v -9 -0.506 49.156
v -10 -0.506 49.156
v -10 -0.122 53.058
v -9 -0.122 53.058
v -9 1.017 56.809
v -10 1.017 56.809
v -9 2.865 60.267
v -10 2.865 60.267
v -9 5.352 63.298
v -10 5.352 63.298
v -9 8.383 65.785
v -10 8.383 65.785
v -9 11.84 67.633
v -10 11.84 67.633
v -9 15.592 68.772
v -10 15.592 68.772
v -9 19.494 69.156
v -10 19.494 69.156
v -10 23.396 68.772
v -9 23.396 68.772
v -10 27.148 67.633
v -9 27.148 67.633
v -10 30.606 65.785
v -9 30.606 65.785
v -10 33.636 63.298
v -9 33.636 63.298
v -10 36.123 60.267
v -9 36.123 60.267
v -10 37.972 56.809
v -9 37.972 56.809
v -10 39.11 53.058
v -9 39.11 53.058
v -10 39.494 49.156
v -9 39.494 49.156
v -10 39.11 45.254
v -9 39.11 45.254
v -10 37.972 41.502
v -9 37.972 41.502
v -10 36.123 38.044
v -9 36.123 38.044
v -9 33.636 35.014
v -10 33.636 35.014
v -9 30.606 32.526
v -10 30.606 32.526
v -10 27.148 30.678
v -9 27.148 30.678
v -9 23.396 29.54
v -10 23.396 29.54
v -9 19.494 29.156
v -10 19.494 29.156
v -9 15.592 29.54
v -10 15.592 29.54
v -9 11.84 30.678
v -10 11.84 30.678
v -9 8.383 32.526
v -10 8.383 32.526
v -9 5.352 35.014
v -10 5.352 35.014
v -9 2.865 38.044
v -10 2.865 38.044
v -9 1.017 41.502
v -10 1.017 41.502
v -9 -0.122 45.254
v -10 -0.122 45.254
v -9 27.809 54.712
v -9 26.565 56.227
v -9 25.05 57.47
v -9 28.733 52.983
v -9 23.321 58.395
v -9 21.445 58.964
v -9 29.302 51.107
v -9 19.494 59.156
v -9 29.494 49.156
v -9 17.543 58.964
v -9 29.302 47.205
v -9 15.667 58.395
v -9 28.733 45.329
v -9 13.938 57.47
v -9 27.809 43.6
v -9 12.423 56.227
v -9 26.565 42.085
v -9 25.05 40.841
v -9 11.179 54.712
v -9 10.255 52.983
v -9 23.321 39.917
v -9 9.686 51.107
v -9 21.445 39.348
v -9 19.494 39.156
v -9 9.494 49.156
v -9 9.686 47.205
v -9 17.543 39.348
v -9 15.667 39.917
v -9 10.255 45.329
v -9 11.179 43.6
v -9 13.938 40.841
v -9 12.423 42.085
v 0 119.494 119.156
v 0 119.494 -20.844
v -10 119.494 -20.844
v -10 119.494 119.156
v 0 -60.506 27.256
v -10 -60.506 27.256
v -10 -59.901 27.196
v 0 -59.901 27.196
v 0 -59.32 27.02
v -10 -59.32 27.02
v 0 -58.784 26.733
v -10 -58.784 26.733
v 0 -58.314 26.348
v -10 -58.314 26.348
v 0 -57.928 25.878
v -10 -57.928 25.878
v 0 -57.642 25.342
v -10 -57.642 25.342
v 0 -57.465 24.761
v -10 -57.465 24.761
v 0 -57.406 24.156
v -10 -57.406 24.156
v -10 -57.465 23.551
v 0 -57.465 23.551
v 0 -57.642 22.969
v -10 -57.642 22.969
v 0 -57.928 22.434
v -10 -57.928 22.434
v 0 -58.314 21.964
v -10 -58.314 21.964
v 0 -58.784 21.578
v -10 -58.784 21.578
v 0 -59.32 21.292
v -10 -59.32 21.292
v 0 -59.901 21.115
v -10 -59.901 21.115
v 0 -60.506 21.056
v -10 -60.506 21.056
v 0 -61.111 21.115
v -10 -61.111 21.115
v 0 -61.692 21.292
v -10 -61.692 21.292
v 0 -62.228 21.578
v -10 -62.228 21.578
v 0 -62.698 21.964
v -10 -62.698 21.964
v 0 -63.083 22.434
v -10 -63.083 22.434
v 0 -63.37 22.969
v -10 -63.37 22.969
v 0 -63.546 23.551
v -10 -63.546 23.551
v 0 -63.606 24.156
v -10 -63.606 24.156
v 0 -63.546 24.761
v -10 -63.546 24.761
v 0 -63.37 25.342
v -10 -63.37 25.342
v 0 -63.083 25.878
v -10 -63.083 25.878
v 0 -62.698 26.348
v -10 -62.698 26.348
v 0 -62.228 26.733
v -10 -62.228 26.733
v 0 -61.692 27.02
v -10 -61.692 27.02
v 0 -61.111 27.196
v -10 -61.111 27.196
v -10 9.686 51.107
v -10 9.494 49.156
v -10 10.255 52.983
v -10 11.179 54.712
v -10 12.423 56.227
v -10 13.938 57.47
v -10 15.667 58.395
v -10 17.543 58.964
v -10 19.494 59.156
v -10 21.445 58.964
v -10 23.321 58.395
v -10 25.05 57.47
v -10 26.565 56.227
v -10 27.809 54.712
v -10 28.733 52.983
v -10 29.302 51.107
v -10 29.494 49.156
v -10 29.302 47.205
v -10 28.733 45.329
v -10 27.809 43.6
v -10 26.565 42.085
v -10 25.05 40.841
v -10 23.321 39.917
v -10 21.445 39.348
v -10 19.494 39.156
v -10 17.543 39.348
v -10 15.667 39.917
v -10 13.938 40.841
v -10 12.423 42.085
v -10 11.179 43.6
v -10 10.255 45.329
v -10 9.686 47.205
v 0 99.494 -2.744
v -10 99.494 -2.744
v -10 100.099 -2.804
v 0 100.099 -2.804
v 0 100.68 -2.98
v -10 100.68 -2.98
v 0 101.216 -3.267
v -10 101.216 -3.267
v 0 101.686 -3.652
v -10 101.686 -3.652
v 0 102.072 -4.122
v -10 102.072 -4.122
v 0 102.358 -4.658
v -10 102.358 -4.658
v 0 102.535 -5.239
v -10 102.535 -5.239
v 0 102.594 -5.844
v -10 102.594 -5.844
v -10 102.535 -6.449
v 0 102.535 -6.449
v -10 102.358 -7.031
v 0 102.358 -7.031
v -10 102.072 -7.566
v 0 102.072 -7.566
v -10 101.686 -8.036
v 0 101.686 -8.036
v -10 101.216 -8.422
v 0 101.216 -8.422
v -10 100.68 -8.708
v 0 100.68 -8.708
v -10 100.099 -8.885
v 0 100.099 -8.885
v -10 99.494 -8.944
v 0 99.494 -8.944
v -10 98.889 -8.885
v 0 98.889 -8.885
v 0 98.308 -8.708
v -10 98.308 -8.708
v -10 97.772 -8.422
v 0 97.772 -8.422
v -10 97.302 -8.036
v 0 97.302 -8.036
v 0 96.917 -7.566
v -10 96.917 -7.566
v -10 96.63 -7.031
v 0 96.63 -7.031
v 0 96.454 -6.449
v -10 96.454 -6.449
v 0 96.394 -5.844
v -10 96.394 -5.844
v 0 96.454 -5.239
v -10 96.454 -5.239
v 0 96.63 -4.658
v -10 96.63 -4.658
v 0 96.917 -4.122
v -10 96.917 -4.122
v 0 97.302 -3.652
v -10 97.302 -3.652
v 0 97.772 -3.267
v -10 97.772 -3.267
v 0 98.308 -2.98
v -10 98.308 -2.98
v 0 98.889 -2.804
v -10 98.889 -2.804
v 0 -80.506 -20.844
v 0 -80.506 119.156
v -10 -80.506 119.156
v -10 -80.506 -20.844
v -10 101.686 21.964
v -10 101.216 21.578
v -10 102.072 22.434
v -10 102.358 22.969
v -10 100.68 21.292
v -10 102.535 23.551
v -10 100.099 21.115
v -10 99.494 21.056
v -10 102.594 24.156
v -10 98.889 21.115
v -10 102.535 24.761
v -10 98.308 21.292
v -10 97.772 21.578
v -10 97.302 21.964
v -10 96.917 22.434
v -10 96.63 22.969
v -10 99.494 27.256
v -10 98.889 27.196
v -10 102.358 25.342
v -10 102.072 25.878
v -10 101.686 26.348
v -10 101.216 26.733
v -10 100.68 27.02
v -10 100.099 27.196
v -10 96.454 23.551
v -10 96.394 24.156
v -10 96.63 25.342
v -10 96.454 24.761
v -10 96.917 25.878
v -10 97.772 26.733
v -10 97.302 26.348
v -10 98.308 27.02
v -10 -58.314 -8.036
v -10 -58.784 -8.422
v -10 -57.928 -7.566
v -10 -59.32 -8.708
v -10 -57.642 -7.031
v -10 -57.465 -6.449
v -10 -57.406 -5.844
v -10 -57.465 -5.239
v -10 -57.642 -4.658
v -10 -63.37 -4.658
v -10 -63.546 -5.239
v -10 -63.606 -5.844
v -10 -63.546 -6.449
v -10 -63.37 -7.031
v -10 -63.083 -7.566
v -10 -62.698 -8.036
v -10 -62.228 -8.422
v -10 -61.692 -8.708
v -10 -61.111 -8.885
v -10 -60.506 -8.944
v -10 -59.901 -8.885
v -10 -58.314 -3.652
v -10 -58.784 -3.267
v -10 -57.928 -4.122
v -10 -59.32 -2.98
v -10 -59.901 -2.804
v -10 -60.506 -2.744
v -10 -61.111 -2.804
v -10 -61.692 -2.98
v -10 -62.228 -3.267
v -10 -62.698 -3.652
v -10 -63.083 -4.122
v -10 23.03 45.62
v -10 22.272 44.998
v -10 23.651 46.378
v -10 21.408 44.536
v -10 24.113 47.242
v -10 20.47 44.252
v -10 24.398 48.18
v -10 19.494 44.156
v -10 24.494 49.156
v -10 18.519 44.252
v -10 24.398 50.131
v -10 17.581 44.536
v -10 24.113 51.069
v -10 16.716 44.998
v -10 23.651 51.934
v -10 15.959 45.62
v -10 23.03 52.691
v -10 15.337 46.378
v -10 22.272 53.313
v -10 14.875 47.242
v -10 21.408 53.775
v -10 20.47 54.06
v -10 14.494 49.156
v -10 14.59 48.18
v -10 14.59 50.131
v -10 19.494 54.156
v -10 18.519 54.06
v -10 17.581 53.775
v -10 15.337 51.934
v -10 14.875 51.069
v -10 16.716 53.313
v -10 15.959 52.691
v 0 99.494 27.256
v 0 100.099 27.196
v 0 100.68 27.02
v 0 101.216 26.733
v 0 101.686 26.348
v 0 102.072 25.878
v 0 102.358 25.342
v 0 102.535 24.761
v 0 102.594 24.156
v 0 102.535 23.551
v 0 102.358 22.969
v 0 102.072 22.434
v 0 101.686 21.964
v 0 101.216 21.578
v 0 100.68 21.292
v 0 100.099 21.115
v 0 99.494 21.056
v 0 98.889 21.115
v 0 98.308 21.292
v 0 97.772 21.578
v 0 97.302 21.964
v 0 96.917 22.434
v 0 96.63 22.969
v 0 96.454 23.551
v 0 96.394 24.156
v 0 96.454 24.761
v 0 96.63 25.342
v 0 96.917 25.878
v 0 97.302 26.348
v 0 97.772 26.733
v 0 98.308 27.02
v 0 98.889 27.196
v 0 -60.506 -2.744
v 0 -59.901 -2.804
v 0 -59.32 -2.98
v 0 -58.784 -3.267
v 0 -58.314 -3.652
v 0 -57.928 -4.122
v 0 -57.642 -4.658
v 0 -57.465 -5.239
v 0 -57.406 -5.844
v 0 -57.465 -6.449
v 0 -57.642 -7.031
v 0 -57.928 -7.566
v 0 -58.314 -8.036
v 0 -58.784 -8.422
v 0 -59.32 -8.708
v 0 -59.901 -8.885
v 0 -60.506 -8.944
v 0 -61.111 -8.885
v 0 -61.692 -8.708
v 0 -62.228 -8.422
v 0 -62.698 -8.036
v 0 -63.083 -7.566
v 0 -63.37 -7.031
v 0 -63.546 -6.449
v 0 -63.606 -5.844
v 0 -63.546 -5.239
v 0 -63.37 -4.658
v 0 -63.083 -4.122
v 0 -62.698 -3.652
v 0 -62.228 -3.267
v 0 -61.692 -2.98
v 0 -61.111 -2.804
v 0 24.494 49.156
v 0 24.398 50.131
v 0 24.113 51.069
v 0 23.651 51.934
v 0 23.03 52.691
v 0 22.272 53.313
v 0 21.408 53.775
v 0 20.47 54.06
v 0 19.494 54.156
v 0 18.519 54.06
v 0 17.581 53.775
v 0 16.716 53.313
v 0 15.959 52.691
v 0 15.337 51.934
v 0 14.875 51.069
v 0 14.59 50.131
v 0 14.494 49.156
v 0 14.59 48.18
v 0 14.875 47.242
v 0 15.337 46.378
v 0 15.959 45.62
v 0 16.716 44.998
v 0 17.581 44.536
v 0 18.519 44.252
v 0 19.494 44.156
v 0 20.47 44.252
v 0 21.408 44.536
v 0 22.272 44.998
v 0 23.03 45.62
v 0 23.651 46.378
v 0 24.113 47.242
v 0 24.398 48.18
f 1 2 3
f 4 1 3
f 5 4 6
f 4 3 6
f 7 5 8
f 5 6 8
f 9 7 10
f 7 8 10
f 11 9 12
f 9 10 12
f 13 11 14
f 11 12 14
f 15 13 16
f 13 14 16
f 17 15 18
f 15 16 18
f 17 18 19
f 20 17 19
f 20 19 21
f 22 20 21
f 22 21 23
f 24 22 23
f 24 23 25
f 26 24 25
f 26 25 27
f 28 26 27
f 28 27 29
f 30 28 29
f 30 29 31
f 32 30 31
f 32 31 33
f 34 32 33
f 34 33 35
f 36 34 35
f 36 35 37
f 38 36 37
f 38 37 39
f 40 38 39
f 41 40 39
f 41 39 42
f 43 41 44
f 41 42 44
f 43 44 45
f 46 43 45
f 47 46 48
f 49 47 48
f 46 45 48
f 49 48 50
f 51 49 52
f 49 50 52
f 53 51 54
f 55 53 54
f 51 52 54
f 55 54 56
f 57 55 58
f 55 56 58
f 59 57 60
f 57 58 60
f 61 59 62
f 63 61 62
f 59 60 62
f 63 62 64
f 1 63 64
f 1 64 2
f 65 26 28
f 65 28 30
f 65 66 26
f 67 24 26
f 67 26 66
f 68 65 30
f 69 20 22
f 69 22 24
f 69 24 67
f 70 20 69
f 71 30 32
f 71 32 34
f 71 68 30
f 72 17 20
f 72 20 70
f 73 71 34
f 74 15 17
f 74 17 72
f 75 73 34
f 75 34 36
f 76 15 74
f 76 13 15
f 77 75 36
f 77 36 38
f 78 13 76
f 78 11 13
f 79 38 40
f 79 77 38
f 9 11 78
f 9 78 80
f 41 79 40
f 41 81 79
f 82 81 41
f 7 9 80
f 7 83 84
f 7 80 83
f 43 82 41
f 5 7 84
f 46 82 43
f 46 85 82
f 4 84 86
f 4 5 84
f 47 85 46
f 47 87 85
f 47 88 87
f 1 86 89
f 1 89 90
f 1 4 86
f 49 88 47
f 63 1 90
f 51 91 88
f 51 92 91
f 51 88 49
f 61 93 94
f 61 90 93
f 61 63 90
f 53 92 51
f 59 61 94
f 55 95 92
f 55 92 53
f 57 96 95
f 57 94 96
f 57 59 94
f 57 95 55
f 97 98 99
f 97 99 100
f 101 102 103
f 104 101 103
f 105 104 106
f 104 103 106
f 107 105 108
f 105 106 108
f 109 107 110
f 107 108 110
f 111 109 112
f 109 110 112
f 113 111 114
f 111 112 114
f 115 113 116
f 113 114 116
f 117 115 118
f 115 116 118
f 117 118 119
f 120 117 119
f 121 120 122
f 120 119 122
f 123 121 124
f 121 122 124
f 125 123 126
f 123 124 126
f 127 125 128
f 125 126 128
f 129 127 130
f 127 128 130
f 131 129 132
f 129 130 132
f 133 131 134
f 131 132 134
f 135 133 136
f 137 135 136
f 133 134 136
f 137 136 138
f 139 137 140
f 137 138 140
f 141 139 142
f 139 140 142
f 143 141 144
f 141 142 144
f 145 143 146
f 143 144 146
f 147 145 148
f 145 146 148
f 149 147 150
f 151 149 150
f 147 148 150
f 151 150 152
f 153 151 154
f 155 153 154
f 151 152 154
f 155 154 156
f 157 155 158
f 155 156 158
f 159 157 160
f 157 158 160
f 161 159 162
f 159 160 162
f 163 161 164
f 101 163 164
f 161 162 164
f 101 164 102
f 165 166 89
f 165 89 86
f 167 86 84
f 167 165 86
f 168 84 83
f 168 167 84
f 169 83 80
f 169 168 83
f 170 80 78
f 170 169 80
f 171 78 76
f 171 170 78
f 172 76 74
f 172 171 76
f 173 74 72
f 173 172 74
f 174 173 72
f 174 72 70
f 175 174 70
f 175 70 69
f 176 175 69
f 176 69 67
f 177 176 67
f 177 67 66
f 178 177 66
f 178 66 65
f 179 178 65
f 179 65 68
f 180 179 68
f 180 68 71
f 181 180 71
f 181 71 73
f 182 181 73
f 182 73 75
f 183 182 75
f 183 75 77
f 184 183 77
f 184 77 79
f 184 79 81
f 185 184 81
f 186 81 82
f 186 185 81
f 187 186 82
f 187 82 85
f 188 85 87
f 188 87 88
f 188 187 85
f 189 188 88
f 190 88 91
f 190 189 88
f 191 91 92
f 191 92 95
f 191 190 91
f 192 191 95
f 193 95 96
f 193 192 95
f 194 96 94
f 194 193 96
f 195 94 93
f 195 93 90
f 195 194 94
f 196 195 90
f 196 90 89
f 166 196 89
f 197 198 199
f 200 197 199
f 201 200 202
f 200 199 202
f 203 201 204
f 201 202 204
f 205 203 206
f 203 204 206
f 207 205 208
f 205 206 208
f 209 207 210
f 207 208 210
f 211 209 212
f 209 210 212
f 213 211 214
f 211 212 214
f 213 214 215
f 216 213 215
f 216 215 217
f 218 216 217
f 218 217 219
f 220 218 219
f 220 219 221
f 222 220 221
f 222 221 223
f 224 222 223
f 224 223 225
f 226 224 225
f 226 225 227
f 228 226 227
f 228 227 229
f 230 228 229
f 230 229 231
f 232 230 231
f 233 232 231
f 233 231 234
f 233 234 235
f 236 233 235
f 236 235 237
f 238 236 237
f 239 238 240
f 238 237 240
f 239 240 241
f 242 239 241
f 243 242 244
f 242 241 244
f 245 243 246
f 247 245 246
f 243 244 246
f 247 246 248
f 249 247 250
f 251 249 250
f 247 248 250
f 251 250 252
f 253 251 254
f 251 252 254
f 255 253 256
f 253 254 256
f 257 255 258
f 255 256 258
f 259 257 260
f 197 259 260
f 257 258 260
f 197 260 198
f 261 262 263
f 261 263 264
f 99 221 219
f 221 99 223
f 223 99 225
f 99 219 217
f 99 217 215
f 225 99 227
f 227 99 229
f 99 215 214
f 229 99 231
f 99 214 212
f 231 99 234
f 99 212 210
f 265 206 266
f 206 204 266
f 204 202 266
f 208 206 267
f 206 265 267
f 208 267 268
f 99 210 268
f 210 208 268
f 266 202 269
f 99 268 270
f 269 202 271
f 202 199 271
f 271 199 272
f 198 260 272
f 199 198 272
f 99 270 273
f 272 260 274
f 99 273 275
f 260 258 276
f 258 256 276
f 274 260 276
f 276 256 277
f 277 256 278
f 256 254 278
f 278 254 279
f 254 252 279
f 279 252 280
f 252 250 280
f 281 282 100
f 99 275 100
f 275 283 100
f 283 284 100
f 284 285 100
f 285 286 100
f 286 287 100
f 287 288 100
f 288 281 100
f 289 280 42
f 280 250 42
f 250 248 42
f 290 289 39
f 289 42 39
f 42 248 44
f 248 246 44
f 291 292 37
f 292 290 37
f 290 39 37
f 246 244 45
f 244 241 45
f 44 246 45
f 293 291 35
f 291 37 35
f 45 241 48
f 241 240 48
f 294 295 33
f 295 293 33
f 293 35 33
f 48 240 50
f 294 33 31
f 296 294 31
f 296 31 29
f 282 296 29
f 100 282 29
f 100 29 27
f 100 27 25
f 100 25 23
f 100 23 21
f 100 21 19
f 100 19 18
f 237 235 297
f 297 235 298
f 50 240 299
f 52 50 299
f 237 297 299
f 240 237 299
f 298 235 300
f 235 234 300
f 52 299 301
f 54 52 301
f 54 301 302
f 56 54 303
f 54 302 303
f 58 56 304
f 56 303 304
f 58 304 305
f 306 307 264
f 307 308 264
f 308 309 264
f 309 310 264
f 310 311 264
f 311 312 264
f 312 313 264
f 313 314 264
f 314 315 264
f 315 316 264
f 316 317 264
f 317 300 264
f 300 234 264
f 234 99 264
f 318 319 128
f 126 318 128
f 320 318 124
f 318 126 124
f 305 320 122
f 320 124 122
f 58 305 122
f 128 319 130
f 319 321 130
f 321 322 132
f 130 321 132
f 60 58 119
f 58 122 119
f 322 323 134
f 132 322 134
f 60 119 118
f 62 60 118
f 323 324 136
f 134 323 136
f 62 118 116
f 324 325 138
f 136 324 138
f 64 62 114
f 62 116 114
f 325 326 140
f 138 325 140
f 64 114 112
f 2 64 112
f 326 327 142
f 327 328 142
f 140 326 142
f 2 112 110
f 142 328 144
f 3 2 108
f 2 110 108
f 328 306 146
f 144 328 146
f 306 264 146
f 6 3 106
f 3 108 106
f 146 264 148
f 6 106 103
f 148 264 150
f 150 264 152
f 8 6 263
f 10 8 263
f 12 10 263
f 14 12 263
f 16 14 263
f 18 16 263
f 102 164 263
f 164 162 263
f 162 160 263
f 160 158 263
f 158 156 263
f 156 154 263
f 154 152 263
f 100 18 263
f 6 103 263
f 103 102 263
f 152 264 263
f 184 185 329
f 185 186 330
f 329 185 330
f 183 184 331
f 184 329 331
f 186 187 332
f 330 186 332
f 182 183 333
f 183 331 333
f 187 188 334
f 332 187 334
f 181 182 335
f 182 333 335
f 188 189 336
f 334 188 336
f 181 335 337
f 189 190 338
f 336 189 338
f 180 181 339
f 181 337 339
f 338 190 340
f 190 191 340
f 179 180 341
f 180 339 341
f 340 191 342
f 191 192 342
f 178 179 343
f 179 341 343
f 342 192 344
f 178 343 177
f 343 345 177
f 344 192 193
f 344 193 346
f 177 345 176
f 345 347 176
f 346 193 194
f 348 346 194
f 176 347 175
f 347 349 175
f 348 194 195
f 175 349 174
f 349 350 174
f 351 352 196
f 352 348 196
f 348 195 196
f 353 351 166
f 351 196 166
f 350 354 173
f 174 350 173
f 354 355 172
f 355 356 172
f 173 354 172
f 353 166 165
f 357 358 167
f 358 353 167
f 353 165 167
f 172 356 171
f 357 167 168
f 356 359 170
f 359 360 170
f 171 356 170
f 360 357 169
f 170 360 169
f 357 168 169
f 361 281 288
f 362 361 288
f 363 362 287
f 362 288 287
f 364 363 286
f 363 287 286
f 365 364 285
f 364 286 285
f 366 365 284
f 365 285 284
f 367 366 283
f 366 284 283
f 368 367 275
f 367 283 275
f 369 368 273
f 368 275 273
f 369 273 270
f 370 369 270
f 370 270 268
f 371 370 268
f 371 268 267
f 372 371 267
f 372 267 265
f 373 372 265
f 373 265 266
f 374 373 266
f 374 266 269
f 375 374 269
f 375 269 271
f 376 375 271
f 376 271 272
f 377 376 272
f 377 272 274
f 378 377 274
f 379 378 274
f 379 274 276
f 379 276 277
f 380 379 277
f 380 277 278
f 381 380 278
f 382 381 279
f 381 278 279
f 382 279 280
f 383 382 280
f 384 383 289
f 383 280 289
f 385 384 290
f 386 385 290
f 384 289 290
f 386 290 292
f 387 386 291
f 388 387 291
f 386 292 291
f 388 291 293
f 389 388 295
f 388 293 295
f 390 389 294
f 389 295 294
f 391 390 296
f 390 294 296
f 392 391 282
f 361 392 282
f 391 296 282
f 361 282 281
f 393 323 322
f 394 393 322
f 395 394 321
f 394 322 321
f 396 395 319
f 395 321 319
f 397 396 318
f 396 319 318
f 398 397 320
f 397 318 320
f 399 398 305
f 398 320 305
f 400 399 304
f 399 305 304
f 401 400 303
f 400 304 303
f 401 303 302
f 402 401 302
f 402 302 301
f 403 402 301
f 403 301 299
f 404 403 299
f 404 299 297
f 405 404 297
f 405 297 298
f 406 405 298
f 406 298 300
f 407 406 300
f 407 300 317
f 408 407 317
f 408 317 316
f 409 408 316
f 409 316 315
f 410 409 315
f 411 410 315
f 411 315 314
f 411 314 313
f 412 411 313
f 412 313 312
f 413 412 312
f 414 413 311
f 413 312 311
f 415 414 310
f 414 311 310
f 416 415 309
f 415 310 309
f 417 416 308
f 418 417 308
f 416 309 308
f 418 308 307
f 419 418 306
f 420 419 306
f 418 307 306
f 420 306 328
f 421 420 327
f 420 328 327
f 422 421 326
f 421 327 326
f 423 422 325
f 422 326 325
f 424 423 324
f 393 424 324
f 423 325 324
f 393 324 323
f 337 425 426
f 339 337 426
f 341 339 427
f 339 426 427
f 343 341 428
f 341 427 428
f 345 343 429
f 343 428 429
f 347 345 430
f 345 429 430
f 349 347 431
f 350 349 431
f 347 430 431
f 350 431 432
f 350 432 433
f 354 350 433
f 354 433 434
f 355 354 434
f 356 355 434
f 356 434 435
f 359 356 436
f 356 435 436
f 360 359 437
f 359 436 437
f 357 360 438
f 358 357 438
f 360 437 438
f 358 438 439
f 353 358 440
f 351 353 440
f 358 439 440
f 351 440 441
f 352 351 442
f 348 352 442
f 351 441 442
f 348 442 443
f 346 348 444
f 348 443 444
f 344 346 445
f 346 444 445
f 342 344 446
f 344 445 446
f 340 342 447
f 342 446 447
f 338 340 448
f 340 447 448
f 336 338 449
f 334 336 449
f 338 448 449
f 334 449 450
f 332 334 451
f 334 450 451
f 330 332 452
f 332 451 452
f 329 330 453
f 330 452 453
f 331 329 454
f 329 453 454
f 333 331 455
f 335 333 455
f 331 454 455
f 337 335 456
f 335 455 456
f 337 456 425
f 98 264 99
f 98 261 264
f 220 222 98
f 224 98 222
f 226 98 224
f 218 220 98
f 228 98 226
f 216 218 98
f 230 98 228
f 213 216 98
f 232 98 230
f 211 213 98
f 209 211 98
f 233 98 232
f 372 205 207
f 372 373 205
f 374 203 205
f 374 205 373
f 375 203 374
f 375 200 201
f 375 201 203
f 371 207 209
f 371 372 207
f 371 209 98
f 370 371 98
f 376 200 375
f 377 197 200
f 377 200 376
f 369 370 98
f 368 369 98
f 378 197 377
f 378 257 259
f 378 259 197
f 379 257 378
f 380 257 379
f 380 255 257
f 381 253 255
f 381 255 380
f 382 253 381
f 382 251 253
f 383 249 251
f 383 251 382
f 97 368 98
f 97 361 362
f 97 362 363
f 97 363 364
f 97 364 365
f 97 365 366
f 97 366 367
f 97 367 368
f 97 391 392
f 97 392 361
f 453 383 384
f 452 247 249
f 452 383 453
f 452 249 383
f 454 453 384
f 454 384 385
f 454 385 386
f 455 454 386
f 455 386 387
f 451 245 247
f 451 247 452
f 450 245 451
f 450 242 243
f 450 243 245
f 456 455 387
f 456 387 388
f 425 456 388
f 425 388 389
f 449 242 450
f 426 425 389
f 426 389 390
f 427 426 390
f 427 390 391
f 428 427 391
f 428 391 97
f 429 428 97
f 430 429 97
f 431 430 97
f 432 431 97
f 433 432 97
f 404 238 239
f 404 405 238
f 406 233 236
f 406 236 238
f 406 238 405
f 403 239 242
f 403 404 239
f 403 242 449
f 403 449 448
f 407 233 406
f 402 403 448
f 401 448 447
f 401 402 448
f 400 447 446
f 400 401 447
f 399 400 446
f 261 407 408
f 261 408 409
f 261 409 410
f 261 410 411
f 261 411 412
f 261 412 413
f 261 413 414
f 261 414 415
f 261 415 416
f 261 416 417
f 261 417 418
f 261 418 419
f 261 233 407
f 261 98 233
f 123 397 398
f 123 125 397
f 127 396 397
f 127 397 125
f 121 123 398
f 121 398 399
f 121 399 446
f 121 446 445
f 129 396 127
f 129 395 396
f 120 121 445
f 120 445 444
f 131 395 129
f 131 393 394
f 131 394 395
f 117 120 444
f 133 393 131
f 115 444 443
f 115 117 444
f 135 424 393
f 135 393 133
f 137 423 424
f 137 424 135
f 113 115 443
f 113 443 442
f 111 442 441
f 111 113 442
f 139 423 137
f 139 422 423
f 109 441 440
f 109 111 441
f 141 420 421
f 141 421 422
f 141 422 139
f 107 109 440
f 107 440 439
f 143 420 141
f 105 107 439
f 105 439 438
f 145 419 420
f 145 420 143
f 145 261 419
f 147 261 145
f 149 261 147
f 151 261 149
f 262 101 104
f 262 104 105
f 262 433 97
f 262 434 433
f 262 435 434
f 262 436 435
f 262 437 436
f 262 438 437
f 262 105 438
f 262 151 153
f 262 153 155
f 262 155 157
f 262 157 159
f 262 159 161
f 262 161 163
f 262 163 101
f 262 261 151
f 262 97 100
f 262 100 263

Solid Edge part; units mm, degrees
sketch "Sketch1" plane through (0, 0, 0) normal (1, 0, 0) x (0, 1, 0)
  line L0 (-80.5059, -20.8442) -> (119.4941, -20.8442)
  line L1 (119.4941, -20.8442) -> (119.4941, 119.1558)
  line L2 (119.4941, 119.1558) -> (-80.5059, 119.1558)
  line L3 (-80.5059, 119.1558) -> (-80.5059, -20.8442)
  dimension "D1" = 140
  dimension "D2" = 200
extrude "Protrusion1" add sketch "Sketch1" against normal blind 10
sketch "Sketch2" plane through (0, 44.4941, 29.1558) normal (1, 0, 0) x (0, 1, 0)
  circle A0 centre (-25, 20) radius 5
  dimension "D1" = 10
extrude "Cutout1" cut sketch "Sketch2" against normal through all
sketch "Sketch3" plane through (-10, 44.4941, 29.1558) normal (-1, 0, 0) x (0, -1, 0)
  circle A0 centre (25, 20) radius 10
  circle A1 centre (25, 20) radius 20
  dimension "D1" = 20
extrude "Cutout2" cut sketch "Sketch3" against normal blind 1
hole "Hole1" at (-10, 99.4941, -5.8442) direction (1, 0, 0) diameter 6.2 end up to next
hole "Hole2" at (-10, -60.5059, -5.8442) direction (1, 0, 0) diameter 6.2 end up to next
hole "Hole3" at (-10, -60.5059, 24.1558) direction (1, 0, 0) diameter 6.2 end up to next
hole "Hole4" at (-10, 99.4941, 24.1558) direction (1, 0, 0) diameter 6.2 end up to next
